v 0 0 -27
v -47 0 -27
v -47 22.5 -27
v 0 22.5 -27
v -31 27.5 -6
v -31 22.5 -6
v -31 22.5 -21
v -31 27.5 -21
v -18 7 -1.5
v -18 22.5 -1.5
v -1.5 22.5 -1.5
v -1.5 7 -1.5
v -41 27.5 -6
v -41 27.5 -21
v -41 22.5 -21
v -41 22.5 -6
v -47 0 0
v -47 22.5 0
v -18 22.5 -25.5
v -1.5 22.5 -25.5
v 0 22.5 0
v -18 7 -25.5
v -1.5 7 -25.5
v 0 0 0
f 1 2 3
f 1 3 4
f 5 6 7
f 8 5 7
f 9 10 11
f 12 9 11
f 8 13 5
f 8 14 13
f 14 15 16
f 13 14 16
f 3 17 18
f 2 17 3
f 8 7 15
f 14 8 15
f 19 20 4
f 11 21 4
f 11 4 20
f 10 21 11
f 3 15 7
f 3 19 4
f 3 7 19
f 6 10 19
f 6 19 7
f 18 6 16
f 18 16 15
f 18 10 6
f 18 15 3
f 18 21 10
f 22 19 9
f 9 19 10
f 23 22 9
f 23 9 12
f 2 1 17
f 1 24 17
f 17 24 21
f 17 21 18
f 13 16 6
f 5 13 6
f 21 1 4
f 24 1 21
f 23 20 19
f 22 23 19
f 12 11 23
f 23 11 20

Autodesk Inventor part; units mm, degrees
ref_plane "YZ Plane" through (0, 0, 0) normal (1, 0, 0) x (0, 1, 0)
ref_plane "XZ Plane" through (0, 0, 0) normal (0, 1, 0) x (-1, 0, 0)
ref_plane "XY Plane" through (0, 0, 0) normal (0, 0, 1) x (1, 0, 0)
sketch "Эскиз1" plane through (0, 0, 0) normal (0, 1, 0) x (-1, 0, 0)
  line L0 (0, 0) -> (47, 0)
  line L1 (47, 0) -> (47, -27)
  line L2 (47, -27) -> (0, -27)
  line L3 (0, -27) -> (0, 0)
  dimension "d0" = 47
  dimension "d1" = 27
extrude "Выдавливание1" add sketch "Эскиз1" along normal blind 22.5
sketch "Эскиз2" plane through (0, 22.5, 0) normal (0, 1, 0) x (1, 0, 0)
  line L0 (-18, 1.5) -> (-1.5, 1.5)
  line L1 (-1.5, 1.5) -> (-1.5, 25.5)
  line L2 (-1.5, 25.5) -> (-18, 25.5)
  line L3 (-18, 25.5) -> (-18, 1.5)
  line L4 (-47, 0) -> (0, 0) projected
  line L5 (0, 0) -> (0, 27) projected
  dimension "d4" = 16.5
  dimension "d5" = 24
  dimension "d6" = 1.5
  dimension "d7" = 1.5
extrude "Выдавливание2" cut sketch "Эскиз2" against normal blind 15.5
sketch "Эскиз3" plane through (0, 22.5, 0) normal (0, 1, 0) x (1, 0, 0)
  line L0 (-41, 6) -> (-31, 6)
  line L1 (-31, 6) -> (-31, 21)
  line L2 (-31, 21) -> (-41, 21)
  line L3 (-41, 21) -> (-41, 6)
  line L4 (-47, 27) -> (-47, 0) projected
  line L5 (-47, 0) -> (0, 0) projected
  dimension "d10" = 10
  dimension "d11" = 15
  dimension "d12" = 6
  dimension "d13" = 6
extrude "Выдавливание3" add sketch "Эскиз3" along normal blind 5
properties part number "Разъем220"
